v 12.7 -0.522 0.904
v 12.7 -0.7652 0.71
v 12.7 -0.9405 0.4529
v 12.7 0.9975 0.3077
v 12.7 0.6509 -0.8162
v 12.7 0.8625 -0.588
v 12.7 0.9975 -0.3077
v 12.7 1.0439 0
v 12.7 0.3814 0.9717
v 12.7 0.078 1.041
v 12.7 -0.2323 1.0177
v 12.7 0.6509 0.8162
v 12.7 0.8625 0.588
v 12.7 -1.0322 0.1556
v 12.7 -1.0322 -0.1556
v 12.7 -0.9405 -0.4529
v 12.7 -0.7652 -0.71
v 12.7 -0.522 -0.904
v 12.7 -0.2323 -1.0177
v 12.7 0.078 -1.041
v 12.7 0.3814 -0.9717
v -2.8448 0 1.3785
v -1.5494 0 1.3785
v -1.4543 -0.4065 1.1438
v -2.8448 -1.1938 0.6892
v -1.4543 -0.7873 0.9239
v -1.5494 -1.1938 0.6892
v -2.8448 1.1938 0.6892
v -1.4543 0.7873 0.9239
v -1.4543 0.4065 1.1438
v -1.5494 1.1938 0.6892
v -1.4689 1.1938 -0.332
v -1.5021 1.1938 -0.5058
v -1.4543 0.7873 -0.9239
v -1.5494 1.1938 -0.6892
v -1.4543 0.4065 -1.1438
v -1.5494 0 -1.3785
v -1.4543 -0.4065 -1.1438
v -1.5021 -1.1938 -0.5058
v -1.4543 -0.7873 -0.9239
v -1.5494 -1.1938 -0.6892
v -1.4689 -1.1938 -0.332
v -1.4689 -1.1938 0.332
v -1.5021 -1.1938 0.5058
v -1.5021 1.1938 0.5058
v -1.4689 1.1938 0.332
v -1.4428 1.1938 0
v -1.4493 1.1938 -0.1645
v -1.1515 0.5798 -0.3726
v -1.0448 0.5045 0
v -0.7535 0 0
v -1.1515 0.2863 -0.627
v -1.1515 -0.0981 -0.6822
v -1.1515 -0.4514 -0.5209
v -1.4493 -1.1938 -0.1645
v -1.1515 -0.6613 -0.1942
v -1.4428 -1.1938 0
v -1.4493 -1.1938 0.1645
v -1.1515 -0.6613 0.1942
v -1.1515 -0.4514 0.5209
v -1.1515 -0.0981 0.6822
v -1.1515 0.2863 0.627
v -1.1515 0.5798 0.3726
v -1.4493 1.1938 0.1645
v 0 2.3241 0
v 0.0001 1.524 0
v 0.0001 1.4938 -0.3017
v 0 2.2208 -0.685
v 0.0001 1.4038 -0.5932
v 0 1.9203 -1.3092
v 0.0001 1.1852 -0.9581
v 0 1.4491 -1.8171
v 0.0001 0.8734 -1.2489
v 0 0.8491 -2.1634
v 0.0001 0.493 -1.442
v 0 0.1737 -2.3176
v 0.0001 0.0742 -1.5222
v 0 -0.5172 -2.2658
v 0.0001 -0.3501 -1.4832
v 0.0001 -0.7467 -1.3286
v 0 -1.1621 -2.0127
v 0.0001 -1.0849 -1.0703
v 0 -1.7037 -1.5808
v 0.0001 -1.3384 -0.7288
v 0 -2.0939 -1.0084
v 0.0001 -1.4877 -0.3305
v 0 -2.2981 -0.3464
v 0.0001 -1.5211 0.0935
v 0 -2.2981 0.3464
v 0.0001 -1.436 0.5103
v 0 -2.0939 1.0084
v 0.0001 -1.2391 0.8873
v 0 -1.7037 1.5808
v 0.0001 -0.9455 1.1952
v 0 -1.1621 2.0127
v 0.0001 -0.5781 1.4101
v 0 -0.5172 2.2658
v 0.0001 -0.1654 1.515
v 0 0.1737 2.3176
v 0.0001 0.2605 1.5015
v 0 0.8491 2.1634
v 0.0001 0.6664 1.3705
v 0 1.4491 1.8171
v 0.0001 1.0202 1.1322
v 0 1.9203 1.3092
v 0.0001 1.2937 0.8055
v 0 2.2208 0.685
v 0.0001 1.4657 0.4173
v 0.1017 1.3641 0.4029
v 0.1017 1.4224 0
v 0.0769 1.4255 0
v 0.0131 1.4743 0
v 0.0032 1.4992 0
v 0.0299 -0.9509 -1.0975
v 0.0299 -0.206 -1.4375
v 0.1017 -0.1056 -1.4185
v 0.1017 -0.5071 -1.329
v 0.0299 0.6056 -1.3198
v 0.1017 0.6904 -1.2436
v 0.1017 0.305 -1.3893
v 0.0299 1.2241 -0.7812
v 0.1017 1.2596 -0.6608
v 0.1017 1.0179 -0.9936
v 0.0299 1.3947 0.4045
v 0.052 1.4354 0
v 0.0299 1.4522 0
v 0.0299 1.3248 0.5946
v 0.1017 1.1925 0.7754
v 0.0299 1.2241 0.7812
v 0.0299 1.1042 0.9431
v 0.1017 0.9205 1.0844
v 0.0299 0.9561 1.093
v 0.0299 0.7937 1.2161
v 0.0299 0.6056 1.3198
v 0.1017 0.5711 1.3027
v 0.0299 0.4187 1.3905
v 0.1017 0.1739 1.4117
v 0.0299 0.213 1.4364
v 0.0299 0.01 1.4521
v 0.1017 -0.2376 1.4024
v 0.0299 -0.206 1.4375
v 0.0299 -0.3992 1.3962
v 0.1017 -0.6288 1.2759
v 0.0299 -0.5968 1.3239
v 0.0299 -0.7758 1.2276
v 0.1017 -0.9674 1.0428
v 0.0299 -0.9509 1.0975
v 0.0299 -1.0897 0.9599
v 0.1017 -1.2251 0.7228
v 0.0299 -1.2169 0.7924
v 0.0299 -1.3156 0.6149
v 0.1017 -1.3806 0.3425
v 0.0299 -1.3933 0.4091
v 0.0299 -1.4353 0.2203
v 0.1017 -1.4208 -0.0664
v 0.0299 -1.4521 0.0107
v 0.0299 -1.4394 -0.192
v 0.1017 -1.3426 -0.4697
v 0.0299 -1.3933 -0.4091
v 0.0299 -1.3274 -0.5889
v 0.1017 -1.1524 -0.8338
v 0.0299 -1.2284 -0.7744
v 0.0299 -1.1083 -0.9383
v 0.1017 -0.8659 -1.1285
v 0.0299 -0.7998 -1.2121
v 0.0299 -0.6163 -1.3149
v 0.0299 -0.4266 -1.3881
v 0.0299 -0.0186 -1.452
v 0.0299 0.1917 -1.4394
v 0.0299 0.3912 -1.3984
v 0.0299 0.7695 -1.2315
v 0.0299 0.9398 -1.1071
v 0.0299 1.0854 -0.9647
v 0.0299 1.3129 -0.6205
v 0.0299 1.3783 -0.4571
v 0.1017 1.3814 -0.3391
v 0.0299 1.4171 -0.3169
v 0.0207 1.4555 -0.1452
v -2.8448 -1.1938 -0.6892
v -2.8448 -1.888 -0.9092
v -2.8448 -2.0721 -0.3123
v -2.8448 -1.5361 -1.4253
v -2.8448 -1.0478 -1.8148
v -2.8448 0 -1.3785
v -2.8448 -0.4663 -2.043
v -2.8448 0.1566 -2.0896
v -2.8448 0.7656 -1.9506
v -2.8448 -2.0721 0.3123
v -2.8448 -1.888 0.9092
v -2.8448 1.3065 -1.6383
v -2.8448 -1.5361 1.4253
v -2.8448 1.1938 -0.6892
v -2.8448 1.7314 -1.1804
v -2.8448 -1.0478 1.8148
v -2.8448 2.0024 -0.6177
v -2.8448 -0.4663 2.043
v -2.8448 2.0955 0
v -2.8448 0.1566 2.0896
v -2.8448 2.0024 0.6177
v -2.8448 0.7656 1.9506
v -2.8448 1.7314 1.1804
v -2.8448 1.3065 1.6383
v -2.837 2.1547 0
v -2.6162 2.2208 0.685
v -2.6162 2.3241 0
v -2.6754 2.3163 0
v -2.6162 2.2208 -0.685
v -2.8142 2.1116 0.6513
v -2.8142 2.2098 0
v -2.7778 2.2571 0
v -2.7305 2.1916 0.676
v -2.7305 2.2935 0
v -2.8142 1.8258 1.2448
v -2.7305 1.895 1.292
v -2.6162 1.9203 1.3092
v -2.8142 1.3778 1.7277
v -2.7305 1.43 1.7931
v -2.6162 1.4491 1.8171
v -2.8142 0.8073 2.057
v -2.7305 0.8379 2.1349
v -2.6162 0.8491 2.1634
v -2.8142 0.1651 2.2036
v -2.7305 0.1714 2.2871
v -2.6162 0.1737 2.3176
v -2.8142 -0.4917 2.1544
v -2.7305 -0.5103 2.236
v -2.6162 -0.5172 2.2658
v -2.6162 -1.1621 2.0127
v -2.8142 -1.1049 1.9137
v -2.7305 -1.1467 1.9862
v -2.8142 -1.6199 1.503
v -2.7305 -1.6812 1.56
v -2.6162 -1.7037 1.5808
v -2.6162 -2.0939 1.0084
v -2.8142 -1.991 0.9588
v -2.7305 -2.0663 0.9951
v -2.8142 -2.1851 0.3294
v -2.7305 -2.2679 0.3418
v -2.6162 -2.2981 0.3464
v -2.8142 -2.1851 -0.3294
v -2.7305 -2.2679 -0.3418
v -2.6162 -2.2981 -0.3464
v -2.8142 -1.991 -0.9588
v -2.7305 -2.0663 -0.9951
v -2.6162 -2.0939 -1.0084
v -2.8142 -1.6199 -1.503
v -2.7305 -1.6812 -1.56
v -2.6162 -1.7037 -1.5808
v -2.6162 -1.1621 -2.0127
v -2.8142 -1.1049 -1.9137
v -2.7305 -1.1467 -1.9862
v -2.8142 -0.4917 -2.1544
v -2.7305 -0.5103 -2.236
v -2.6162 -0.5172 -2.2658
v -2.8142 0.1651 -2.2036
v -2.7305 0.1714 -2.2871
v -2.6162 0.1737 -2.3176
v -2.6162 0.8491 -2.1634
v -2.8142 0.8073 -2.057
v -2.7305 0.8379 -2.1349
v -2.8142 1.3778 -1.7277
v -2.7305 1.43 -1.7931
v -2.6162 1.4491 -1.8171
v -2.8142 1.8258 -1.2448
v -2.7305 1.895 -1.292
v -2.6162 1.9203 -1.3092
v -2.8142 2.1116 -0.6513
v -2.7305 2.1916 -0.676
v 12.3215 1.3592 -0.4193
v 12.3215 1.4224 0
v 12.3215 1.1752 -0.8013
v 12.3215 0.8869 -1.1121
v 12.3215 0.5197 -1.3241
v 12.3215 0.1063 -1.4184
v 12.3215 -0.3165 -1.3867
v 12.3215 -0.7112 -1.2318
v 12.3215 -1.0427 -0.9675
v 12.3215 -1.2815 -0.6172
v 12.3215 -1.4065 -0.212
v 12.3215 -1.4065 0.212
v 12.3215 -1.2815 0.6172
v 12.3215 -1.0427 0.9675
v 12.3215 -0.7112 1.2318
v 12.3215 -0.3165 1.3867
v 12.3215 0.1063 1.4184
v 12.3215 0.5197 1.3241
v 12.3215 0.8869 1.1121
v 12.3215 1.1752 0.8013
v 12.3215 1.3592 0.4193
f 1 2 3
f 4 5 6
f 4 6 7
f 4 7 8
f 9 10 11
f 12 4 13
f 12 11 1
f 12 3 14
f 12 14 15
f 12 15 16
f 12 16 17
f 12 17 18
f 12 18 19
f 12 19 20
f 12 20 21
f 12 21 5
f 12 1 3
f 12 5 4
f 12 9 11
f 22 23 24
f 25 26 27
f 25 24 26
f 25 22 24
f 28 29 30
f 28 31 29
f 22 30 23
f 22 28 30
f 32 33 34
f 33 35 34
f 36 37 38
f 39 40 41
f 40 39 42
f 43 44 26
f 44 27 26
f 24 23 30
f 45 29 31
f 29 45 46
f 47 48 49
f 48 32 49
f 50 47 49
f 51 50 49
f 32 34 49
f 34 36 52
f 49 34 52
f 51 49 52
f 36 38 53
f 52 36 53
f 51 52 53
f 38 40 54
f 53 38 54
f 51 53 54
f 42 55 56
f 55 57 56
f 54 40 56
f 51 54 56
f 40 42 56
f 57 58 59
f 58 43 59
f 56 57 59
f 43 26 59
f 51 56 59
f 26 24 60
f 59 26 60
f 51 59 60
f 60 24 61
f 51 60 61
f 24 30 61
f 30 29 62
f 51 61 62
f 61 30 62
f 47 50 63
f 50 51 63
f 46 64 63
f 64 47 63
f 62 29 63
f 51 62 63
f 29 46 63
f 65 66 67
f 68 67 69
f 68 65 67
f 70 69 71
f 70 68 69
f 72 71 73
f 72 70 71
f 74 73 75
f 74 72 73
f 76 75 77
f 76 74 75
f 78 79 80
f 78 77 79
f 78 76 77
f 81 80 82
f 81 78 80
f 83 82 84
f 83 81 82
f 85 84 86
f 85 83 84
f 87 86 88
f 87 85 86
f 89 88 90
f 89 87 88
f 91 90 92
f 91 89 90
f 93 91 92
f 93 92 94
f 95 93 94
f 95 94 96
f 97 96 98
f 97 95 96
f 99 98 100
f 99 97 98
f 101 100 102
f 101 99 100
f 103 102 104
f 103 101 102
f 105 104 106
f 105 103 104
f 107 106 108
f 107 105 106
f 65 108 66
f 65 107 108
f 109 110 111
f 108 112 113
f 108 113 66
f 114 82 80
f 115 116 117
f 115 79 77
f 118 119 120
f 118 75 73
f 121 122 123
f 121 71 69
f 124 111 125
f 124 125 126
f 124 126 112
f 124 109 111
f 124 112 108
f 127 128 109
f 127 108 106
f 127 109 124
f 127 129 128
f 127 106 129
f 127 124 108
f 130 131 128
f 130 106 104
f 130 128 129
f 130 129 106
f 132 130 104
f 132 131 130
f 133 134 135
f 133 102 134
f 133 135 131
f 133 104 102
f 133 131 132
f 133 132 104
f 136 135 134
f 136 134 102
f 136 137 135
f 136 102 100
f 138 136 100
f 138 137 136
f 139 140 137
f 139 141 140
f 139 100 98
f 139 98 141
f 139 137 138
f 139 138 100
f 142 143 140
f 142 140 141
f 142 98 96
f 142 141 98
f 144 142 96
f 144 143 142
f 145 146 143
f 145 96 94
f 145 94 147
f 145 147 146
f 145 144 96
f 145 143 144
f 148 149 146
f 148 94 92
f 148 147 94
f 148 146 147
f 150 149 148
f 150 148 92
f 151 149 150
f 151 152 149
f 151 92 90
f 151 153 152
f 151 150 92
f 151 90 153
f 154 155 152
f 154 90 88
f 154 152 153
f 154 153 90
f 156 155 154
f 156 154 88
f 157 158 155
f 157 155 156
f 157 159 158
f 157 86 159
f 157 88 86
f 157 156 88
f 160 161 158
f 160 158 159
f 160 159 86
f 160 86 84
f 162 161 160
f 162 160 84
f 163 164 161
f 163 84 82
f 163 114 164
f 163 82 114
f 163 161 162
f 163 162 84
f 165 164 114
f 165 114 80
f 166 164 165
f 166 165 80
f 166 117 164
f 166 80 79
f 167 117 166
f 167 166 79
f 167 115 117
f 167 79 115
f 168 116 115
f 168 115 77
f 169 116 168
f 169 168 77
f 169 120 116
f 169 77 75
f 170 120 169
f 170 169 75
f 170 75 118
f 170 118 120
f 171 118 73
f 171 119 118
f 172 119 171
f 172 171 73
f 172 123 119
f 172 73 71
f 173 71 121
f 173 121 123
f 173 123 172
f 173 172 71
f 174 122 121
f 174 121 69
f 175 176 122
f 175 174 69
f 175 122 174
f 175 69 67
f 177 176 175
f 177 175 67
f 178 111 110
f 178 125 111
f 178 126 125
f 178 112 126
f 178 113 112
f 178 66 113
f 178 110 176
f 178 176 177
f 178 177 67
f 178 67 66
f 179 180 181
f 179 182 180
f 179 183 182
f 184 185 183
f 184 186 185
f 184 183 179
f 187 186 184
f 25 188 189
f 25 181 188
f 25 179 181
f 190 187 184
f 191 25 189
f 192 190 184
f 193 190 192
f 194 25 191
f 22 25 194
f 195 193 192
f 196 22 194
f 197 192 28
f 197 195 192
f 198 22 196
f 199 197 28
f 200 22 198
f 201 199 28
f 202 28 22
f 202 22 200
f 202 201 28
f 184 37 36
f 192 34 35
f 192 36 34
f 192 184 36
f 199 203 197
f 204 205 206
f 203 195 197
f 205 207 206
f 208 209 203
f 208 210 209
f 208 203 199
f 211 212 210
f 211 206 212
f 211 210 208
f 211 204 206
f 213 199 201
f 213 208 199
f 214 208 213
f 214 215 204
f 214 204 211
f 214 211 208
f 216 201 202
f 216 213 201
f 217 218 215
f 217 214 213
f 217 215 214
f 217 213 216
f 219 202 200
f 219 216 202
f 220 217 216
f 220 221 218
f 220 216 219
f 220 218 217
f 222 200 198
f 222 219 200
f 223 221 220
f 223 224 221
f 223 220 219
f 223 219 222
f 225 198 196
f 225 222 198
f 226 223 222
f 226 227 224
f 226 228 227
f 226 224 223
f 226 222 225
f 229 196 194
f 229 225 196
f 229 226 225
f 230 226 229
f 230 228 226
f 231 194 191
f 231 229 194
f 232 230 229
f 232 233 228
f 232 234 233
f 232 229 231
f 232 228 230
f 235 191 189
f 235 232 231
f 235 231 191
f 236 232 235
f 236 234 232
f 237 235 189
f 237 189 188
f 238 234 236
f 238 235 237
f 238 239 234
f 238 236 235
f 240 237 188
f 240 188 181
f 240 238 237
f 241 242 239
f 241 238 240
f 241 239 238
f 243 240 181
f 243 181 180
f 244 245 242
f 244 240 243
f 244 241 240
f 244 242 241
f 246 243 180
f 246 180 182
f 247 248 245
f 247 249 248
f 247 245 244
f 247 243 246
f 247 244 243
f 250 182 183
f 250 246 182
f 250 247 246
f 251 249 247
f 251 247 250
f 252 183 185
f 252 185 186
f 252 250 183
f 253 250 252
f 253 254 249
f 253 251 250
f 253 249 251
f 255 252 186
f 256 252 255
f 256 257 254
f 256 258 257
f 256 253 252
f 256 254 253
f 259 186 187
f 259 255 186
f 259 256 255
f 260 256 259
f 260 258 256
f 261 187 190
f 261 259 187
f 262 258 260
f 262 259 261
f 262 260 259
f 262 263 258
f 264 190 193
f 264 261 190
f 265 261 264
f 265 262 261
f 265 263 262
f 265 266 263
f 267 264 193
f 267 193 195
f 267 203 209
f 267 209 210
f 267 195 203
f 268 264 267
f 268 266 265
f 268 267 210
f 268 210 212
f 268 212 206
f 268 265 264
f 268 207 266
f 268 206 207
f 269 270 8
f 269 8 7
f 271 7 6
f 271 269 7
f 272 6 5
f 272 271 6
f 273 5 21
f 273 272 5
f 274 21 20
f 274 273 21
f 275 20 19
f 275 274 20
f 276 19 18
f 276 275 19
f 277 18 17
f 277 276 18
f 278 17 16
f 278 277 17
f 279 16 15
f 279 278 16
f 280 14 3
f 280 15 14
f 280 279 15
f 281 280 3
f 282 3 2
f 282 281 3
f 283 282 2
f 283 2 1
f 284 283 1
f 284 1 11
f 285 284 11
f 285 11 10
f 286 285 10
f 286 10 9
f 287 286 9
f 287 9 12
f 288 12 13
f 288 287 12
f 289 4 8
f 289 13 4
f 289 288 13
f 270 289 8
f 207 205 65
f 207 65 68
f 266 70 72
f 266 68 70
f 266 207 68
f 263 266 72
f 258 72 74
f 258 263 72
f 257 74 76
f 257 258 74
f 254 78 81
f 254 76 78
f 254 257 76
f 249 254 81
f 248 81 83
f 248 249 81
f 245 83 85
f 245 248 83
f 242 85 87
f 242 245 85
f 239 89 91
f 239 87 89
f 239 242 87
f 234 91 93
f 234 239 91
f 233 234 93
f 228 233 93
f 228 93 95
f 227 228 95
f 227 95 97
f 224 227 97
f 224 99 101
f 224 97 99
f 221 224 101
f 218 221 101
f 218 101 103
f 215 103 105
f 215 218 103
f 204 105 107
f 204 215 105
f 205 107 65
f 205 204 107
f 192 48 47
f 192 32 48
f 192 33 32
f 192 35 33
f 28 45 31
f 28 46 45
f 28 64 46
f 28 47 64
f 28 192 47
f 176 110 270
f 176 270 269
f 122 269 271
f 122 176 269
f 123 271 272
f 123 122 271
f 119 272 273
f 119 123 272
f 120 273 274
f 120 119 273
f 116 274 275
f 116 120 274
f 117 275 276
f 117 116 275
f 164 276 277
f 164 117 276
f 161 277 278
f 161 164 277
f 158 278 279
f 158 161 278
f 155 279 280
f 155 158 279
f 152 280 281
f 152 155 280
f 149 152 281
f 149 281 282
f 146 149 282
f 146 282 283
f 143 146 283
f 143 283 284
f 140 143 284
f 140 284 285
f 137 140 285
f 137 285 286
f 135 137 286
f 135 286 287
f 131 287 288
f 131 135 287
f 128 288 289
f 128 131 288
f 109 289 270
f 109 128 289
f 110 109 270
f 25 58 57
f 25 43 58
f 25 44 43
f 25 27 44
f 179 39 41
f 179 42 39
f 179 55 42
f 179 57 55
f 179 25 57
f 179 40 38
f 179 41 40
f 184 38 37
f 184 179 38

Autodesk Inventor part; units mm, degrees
ref_plane "YZ Plane" through (0, 0, 0) normal (1, 0, 0) x (0, 1, 0)
ref_plane "XZ Plane" through (0, 0, 0) normal (0, 1, 0) x (-1, 0, 0)
sketch "Sketch1" plane through (0, 0, 0) normal (0, 0, 1) x (1, 0, 0)
  line L0 (-0.7535, 0) -> (12.7, 0)
  line L1 (12.7, 0) -> (12.7, 1.4224)
  line L2 (12.7, 1.4224) -> (1.5877, 1.4224)
  line L3 (1.5877, 1.4224) -> (0.0001, 1.4224)
  line L4 (0.0001, 1.4224) -> (0, 1.4224)
  line L5 (0, 1.4224) -> (0, 2.3241)
  line L6 (0, 2.3241) -> (-2.8448, 2.3241)
  line L7 (-2.8448, 2.3241) -> (-2.8448, 1.3785)
  line L8 (-2.8448, 1.3785) -> (-1.5494, 1.3785)
  line L9 (-1.5494, 1.3785) -> (-0.7535, 0)
  line L10 (-5.9538, 0) -> (15.809, 0) projected
  line L11 (0, -0.4648) -> (0, 2.7889) projected
  line L12 (1.5877, 1.4224) -> (0, 1.4224) construction
  dimension "d1" = 11.1123
  dimension "d2" = 1.5876
  dimension "d3" = 2.8448
  dimension "d4" = 1.2954
  dimension "d5" = 60
  dimension "d6" = 2.8448
  dimension "d7" = 2.8448
  dimension "d8" = 2.757
  dimension "d9" = 4.6482
  dimension "d26" = 12.7
revolve "Body" add sketch "Sketch1" angle 360 about axis through (-0.7535, 0, 0) along (1, 0, 0)
sketch "Sketch2" plane through (-2.8448, 0, 0) normal (-1, 0, 0) x (0, 0, 1)
  circle A0 centre (0, 0) radius 1.3785 projected
  line L0 (0, -3.2537) -> (0, 3.2537) projected
  line L1 (-3.2537, 0) -> (3.2537, 0) projected
  line L2 (1.3785, 0) -> (0.6892, -1.1938)
  line L3 (0.6892, -1.1938) -> (-0.6892, -1.1938)
  line L4 (-0.6892, -1.1938) -> (-1.3785, 0)
  line L5 (-1.3785, 0) -> (-0.6892, 1.1938)
  line L6 (-0.6892, 1.1938) -> (0.6892, 1.1938)
  line L7 (0.6892, 1.1938) -> (1.3785, 0)
  point P0 (0, 0)
extrude "Slot" add sketch "Sketch2" against normal up to next contours L7 A0 | A0 L2 | L6 L0 A0 | A0 L0 L3 | L0 L6 A0 | A0 L3 L0 | L4 A0 | A0 L5
fillet "Fillet1" radius 0.2286 1 edges at (-2.8448, -2.3241, 0)
thread "Thread" size "4-40 UNC" class "2A" standard "ANSI Unified Screw Threads" length 11.1123
chamfer "Chamfer1" distance 0.3785 distance2 0.3785 1 edges at (12.7, -1.4224, 0) measured on face at (12.7, -0.2537, -0.5191)
ref_plane "Work Plane1" through (29, 0, 0) normal (0, -1, 0) x (1, 0, 0)
fillet "Fillet2" radius 0.1016 1 edges at (0.0001, -1.4224, 0)
equation "\"d1\" = GEL"
equation "\"d3\" = KOH"
equation "\"d4\" = INTI"
equation "\"d6\" = GD"
equation "\"d7\" = BDM"
equation "\"d8\" = 1.1547 * SW"
equation "\"d9\" = KOD"
equation "\"d26\" = NLG"
equation "\"d30\" = R"
equation "\"d17\" = RR"
equation "\"d13\" = GEL"
equation "\"d15\" = -0.5 * SPD + 0.5 * GD"
equation "\"d16\" = GUL"
equation "\"GD\" = 2.8448"
equation "\"NLG\" = 12.7"
equation "\"GEL\" = 11.1123"
equation "\"KOD\" = 4.6482"
equation "\"KOH\" = 2.8448"
equation "\"INTI\" = 1.2954"
equation "\"GAL\" = 1.5875"
equation "\"GUL\" = 0.37846"
equation "\"BDM\" = 2.8448"
equation "\"SW\" = 2.3876"
equation "\"RR\" = 0.2286"
equation "\"SPD\" = 2.08788"
equation "\"R\" = 0.1016"
equation "\"PHH\" = 0.127"
equation "\"GD1\" = SPD"
equation "\"THREADDIA\" = 2.8448"
equation "\"FAWI\" = 45deg"
equation "\"KOH1\" = 2.5654"
equation "\"NND\" = 2.8448"
equation "\"TOA\" = 30deg"
equation "\"E0\" = 1.155 * SW"
properties part number "ANSI B18.3 - No. 4 - 40 UNC - 1/2 HS HCS" material "Steel, Mild"
